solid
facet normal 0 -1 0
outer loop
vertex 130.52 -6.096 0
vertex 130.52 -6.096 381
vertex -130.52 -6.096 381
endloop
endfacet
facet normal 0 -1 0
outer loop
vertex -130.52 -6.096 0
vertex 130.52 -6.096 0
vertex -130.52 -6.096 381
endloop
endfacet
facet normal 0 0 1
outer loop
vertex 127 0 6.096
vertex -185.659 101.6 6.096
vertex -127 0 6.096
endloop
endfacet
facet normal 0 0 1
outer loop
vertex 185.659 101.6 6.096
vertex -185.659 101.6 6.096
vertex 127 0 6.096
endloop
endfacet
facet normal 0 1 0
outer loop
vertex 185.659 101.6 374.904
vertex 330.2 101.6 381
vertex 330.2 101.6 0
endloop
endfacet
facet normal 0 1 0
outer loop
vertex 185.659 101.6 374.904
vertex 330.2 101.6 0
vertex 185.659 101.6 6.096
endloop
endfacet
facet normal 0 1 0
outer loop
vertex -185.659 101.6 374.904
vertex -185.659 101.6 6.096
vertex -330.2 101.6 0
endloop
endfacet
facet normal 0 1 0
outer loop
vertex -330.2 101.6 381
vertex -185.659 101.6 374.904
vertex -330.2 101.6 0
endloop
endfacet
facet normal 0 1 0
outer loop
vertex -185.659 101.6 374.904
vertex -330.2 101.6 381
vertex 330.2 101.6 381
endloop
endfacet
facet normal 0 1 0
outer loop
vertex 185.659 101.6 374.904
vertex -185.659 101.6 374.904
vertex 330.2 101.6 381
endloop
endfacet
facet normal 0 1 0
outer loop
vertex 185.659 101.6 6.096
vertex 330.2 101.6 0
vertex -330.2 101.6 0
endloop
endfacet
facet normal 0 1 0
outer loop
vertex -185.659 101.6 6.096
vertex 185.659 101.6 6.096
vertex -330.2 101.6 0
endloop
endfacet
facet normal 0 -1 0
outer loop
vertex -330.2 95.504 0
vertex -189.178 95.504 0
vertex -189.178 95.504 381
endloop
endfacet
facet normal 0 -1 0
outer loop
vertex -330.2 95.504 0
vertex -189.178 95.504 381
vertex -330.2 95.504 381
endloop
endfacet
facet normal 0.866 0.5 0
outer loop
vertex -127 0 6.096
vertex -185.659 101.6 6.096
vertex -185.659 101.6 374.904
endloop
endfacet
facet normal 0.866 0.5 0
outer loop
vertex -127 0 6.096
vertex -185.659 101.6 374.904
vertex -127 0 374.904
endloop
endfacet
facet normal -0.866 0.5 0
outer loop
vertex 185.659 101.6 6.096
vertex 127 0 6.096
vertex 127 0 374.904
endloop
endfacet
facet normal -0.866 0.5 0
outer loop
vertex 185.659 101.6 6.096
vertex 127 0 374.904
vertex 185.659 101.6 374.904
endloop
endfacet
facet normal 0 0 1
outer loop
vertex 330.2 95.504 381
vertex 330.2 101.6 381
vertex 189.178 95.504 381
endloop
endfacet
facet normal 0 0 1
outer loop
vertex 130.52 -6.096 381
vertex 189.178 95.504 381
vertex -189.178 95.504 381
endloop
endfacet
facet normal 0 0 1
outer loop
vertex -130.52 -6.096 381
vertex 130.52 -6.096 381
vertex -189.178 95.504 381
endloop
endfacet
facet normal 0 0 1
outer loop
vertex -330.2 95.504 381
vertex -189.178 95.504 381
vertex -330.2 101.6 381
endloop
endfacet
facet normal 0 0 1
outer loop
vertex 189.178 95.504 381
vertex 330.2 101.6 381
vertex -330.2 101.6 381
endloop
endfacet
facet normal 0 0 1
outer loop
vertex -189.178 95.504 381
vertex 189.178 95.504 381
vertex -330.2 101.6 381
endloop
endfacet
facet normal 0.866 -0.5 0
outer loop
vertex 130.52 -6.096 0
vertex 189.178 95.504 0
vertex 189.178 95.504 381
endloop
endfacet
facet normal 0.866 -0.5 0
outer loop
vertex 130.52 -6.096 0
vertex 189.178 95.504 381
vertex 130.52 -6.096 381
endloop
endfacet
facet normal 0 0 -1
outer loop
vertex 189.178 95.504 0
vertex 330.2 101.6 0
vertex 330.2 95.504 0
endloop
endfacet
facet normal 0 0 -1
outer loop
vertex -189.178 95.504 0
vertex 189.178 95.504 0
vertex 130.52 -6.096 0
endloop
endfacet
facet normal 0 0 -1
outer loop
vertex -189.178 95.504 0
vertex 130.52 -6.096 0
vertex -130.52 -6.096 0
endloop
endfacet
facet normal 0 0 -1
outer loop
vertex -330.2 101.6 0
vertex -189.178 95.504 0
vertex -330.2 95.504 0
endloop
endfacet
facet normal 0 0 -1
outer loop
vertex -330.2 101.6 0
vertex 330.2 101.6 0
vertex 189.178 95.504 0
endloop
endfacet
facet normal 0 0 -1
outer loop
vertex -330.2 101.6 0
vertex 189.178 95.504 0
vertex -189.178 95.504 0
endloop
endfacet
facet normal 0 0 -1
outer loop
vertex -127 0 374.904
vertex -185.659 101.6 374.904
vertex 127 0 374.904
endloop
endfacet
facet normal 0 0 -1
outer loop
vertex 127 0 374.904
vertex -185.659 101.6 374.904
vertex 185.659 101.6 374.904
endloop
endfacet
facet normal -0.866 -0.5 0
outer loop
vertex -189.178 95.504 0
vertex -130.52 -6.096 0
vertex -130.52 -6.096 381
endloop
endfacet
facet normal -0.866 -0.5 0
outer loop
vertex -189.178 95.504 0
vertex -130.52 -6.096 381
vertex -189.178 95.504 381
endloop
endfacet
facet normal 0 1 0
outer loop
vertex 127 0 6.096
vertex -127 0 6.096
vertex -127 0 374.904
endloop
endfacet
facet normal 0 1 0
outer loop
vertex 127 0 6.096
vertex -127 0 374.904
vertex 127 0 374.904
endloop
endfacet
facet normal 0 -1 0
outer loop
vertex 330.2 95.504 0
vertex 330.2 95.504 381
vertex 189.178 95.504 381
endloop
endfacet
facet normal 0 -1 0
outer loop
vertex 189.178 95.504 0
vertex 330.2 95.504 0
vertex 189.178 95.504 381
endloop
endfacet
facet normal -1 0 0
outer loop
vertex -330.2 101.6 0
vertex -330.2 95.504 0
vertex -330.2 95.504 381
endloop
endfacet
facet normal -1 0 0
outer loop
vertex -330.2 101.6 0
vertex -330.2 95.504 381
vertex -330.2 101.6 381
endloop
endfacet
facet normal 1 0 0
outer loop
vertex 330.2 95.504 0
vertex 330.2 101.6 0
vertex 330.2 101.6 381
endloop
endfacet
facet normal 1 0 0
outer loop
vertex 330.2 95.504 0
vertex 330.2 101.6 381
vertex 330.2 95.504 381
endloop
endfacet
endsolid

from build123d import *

# Parameters (mm, degrees)
BOSS_EXTRUDE2_DEPTH = 381
SHELL1_START        = 6.096
SHELL1_DEPTH        = 368.808


# Read off the part's stored shape, not the designer's step: Shell1
with BuildPart() as part:
    # Sketch2 → Boss-Extrude2 (new body)
    with BuildSketch(Plane.XY):
        Polygon((-330.2, 101.6), (-185.65878735, 101.6), (185.65878735, 101.6), (330.2, 101.6), (330.2, 95.504), (189.178314591, 95.504), (130.519527241, -6.096), (-130.519527241, -6.096), (-189.178314591, 95.504), (-330.2, 95.504), align=None)
    extrude(amount=BOSS_EXTRUDE2_DEPTH)

    # Shell1 outline → Shell1 (cut)
    with BuildSketch(Plane.XY.offset(SHELL1_START)):
        Polygon((-185.65878735, 101.6), (-127, 0), (127, 0), (185.65878735, 101.6), align=None)
    extrude(amount=SHELL1_DEPTH, mode=Mode.SUBTRACT)


solid = part.part
